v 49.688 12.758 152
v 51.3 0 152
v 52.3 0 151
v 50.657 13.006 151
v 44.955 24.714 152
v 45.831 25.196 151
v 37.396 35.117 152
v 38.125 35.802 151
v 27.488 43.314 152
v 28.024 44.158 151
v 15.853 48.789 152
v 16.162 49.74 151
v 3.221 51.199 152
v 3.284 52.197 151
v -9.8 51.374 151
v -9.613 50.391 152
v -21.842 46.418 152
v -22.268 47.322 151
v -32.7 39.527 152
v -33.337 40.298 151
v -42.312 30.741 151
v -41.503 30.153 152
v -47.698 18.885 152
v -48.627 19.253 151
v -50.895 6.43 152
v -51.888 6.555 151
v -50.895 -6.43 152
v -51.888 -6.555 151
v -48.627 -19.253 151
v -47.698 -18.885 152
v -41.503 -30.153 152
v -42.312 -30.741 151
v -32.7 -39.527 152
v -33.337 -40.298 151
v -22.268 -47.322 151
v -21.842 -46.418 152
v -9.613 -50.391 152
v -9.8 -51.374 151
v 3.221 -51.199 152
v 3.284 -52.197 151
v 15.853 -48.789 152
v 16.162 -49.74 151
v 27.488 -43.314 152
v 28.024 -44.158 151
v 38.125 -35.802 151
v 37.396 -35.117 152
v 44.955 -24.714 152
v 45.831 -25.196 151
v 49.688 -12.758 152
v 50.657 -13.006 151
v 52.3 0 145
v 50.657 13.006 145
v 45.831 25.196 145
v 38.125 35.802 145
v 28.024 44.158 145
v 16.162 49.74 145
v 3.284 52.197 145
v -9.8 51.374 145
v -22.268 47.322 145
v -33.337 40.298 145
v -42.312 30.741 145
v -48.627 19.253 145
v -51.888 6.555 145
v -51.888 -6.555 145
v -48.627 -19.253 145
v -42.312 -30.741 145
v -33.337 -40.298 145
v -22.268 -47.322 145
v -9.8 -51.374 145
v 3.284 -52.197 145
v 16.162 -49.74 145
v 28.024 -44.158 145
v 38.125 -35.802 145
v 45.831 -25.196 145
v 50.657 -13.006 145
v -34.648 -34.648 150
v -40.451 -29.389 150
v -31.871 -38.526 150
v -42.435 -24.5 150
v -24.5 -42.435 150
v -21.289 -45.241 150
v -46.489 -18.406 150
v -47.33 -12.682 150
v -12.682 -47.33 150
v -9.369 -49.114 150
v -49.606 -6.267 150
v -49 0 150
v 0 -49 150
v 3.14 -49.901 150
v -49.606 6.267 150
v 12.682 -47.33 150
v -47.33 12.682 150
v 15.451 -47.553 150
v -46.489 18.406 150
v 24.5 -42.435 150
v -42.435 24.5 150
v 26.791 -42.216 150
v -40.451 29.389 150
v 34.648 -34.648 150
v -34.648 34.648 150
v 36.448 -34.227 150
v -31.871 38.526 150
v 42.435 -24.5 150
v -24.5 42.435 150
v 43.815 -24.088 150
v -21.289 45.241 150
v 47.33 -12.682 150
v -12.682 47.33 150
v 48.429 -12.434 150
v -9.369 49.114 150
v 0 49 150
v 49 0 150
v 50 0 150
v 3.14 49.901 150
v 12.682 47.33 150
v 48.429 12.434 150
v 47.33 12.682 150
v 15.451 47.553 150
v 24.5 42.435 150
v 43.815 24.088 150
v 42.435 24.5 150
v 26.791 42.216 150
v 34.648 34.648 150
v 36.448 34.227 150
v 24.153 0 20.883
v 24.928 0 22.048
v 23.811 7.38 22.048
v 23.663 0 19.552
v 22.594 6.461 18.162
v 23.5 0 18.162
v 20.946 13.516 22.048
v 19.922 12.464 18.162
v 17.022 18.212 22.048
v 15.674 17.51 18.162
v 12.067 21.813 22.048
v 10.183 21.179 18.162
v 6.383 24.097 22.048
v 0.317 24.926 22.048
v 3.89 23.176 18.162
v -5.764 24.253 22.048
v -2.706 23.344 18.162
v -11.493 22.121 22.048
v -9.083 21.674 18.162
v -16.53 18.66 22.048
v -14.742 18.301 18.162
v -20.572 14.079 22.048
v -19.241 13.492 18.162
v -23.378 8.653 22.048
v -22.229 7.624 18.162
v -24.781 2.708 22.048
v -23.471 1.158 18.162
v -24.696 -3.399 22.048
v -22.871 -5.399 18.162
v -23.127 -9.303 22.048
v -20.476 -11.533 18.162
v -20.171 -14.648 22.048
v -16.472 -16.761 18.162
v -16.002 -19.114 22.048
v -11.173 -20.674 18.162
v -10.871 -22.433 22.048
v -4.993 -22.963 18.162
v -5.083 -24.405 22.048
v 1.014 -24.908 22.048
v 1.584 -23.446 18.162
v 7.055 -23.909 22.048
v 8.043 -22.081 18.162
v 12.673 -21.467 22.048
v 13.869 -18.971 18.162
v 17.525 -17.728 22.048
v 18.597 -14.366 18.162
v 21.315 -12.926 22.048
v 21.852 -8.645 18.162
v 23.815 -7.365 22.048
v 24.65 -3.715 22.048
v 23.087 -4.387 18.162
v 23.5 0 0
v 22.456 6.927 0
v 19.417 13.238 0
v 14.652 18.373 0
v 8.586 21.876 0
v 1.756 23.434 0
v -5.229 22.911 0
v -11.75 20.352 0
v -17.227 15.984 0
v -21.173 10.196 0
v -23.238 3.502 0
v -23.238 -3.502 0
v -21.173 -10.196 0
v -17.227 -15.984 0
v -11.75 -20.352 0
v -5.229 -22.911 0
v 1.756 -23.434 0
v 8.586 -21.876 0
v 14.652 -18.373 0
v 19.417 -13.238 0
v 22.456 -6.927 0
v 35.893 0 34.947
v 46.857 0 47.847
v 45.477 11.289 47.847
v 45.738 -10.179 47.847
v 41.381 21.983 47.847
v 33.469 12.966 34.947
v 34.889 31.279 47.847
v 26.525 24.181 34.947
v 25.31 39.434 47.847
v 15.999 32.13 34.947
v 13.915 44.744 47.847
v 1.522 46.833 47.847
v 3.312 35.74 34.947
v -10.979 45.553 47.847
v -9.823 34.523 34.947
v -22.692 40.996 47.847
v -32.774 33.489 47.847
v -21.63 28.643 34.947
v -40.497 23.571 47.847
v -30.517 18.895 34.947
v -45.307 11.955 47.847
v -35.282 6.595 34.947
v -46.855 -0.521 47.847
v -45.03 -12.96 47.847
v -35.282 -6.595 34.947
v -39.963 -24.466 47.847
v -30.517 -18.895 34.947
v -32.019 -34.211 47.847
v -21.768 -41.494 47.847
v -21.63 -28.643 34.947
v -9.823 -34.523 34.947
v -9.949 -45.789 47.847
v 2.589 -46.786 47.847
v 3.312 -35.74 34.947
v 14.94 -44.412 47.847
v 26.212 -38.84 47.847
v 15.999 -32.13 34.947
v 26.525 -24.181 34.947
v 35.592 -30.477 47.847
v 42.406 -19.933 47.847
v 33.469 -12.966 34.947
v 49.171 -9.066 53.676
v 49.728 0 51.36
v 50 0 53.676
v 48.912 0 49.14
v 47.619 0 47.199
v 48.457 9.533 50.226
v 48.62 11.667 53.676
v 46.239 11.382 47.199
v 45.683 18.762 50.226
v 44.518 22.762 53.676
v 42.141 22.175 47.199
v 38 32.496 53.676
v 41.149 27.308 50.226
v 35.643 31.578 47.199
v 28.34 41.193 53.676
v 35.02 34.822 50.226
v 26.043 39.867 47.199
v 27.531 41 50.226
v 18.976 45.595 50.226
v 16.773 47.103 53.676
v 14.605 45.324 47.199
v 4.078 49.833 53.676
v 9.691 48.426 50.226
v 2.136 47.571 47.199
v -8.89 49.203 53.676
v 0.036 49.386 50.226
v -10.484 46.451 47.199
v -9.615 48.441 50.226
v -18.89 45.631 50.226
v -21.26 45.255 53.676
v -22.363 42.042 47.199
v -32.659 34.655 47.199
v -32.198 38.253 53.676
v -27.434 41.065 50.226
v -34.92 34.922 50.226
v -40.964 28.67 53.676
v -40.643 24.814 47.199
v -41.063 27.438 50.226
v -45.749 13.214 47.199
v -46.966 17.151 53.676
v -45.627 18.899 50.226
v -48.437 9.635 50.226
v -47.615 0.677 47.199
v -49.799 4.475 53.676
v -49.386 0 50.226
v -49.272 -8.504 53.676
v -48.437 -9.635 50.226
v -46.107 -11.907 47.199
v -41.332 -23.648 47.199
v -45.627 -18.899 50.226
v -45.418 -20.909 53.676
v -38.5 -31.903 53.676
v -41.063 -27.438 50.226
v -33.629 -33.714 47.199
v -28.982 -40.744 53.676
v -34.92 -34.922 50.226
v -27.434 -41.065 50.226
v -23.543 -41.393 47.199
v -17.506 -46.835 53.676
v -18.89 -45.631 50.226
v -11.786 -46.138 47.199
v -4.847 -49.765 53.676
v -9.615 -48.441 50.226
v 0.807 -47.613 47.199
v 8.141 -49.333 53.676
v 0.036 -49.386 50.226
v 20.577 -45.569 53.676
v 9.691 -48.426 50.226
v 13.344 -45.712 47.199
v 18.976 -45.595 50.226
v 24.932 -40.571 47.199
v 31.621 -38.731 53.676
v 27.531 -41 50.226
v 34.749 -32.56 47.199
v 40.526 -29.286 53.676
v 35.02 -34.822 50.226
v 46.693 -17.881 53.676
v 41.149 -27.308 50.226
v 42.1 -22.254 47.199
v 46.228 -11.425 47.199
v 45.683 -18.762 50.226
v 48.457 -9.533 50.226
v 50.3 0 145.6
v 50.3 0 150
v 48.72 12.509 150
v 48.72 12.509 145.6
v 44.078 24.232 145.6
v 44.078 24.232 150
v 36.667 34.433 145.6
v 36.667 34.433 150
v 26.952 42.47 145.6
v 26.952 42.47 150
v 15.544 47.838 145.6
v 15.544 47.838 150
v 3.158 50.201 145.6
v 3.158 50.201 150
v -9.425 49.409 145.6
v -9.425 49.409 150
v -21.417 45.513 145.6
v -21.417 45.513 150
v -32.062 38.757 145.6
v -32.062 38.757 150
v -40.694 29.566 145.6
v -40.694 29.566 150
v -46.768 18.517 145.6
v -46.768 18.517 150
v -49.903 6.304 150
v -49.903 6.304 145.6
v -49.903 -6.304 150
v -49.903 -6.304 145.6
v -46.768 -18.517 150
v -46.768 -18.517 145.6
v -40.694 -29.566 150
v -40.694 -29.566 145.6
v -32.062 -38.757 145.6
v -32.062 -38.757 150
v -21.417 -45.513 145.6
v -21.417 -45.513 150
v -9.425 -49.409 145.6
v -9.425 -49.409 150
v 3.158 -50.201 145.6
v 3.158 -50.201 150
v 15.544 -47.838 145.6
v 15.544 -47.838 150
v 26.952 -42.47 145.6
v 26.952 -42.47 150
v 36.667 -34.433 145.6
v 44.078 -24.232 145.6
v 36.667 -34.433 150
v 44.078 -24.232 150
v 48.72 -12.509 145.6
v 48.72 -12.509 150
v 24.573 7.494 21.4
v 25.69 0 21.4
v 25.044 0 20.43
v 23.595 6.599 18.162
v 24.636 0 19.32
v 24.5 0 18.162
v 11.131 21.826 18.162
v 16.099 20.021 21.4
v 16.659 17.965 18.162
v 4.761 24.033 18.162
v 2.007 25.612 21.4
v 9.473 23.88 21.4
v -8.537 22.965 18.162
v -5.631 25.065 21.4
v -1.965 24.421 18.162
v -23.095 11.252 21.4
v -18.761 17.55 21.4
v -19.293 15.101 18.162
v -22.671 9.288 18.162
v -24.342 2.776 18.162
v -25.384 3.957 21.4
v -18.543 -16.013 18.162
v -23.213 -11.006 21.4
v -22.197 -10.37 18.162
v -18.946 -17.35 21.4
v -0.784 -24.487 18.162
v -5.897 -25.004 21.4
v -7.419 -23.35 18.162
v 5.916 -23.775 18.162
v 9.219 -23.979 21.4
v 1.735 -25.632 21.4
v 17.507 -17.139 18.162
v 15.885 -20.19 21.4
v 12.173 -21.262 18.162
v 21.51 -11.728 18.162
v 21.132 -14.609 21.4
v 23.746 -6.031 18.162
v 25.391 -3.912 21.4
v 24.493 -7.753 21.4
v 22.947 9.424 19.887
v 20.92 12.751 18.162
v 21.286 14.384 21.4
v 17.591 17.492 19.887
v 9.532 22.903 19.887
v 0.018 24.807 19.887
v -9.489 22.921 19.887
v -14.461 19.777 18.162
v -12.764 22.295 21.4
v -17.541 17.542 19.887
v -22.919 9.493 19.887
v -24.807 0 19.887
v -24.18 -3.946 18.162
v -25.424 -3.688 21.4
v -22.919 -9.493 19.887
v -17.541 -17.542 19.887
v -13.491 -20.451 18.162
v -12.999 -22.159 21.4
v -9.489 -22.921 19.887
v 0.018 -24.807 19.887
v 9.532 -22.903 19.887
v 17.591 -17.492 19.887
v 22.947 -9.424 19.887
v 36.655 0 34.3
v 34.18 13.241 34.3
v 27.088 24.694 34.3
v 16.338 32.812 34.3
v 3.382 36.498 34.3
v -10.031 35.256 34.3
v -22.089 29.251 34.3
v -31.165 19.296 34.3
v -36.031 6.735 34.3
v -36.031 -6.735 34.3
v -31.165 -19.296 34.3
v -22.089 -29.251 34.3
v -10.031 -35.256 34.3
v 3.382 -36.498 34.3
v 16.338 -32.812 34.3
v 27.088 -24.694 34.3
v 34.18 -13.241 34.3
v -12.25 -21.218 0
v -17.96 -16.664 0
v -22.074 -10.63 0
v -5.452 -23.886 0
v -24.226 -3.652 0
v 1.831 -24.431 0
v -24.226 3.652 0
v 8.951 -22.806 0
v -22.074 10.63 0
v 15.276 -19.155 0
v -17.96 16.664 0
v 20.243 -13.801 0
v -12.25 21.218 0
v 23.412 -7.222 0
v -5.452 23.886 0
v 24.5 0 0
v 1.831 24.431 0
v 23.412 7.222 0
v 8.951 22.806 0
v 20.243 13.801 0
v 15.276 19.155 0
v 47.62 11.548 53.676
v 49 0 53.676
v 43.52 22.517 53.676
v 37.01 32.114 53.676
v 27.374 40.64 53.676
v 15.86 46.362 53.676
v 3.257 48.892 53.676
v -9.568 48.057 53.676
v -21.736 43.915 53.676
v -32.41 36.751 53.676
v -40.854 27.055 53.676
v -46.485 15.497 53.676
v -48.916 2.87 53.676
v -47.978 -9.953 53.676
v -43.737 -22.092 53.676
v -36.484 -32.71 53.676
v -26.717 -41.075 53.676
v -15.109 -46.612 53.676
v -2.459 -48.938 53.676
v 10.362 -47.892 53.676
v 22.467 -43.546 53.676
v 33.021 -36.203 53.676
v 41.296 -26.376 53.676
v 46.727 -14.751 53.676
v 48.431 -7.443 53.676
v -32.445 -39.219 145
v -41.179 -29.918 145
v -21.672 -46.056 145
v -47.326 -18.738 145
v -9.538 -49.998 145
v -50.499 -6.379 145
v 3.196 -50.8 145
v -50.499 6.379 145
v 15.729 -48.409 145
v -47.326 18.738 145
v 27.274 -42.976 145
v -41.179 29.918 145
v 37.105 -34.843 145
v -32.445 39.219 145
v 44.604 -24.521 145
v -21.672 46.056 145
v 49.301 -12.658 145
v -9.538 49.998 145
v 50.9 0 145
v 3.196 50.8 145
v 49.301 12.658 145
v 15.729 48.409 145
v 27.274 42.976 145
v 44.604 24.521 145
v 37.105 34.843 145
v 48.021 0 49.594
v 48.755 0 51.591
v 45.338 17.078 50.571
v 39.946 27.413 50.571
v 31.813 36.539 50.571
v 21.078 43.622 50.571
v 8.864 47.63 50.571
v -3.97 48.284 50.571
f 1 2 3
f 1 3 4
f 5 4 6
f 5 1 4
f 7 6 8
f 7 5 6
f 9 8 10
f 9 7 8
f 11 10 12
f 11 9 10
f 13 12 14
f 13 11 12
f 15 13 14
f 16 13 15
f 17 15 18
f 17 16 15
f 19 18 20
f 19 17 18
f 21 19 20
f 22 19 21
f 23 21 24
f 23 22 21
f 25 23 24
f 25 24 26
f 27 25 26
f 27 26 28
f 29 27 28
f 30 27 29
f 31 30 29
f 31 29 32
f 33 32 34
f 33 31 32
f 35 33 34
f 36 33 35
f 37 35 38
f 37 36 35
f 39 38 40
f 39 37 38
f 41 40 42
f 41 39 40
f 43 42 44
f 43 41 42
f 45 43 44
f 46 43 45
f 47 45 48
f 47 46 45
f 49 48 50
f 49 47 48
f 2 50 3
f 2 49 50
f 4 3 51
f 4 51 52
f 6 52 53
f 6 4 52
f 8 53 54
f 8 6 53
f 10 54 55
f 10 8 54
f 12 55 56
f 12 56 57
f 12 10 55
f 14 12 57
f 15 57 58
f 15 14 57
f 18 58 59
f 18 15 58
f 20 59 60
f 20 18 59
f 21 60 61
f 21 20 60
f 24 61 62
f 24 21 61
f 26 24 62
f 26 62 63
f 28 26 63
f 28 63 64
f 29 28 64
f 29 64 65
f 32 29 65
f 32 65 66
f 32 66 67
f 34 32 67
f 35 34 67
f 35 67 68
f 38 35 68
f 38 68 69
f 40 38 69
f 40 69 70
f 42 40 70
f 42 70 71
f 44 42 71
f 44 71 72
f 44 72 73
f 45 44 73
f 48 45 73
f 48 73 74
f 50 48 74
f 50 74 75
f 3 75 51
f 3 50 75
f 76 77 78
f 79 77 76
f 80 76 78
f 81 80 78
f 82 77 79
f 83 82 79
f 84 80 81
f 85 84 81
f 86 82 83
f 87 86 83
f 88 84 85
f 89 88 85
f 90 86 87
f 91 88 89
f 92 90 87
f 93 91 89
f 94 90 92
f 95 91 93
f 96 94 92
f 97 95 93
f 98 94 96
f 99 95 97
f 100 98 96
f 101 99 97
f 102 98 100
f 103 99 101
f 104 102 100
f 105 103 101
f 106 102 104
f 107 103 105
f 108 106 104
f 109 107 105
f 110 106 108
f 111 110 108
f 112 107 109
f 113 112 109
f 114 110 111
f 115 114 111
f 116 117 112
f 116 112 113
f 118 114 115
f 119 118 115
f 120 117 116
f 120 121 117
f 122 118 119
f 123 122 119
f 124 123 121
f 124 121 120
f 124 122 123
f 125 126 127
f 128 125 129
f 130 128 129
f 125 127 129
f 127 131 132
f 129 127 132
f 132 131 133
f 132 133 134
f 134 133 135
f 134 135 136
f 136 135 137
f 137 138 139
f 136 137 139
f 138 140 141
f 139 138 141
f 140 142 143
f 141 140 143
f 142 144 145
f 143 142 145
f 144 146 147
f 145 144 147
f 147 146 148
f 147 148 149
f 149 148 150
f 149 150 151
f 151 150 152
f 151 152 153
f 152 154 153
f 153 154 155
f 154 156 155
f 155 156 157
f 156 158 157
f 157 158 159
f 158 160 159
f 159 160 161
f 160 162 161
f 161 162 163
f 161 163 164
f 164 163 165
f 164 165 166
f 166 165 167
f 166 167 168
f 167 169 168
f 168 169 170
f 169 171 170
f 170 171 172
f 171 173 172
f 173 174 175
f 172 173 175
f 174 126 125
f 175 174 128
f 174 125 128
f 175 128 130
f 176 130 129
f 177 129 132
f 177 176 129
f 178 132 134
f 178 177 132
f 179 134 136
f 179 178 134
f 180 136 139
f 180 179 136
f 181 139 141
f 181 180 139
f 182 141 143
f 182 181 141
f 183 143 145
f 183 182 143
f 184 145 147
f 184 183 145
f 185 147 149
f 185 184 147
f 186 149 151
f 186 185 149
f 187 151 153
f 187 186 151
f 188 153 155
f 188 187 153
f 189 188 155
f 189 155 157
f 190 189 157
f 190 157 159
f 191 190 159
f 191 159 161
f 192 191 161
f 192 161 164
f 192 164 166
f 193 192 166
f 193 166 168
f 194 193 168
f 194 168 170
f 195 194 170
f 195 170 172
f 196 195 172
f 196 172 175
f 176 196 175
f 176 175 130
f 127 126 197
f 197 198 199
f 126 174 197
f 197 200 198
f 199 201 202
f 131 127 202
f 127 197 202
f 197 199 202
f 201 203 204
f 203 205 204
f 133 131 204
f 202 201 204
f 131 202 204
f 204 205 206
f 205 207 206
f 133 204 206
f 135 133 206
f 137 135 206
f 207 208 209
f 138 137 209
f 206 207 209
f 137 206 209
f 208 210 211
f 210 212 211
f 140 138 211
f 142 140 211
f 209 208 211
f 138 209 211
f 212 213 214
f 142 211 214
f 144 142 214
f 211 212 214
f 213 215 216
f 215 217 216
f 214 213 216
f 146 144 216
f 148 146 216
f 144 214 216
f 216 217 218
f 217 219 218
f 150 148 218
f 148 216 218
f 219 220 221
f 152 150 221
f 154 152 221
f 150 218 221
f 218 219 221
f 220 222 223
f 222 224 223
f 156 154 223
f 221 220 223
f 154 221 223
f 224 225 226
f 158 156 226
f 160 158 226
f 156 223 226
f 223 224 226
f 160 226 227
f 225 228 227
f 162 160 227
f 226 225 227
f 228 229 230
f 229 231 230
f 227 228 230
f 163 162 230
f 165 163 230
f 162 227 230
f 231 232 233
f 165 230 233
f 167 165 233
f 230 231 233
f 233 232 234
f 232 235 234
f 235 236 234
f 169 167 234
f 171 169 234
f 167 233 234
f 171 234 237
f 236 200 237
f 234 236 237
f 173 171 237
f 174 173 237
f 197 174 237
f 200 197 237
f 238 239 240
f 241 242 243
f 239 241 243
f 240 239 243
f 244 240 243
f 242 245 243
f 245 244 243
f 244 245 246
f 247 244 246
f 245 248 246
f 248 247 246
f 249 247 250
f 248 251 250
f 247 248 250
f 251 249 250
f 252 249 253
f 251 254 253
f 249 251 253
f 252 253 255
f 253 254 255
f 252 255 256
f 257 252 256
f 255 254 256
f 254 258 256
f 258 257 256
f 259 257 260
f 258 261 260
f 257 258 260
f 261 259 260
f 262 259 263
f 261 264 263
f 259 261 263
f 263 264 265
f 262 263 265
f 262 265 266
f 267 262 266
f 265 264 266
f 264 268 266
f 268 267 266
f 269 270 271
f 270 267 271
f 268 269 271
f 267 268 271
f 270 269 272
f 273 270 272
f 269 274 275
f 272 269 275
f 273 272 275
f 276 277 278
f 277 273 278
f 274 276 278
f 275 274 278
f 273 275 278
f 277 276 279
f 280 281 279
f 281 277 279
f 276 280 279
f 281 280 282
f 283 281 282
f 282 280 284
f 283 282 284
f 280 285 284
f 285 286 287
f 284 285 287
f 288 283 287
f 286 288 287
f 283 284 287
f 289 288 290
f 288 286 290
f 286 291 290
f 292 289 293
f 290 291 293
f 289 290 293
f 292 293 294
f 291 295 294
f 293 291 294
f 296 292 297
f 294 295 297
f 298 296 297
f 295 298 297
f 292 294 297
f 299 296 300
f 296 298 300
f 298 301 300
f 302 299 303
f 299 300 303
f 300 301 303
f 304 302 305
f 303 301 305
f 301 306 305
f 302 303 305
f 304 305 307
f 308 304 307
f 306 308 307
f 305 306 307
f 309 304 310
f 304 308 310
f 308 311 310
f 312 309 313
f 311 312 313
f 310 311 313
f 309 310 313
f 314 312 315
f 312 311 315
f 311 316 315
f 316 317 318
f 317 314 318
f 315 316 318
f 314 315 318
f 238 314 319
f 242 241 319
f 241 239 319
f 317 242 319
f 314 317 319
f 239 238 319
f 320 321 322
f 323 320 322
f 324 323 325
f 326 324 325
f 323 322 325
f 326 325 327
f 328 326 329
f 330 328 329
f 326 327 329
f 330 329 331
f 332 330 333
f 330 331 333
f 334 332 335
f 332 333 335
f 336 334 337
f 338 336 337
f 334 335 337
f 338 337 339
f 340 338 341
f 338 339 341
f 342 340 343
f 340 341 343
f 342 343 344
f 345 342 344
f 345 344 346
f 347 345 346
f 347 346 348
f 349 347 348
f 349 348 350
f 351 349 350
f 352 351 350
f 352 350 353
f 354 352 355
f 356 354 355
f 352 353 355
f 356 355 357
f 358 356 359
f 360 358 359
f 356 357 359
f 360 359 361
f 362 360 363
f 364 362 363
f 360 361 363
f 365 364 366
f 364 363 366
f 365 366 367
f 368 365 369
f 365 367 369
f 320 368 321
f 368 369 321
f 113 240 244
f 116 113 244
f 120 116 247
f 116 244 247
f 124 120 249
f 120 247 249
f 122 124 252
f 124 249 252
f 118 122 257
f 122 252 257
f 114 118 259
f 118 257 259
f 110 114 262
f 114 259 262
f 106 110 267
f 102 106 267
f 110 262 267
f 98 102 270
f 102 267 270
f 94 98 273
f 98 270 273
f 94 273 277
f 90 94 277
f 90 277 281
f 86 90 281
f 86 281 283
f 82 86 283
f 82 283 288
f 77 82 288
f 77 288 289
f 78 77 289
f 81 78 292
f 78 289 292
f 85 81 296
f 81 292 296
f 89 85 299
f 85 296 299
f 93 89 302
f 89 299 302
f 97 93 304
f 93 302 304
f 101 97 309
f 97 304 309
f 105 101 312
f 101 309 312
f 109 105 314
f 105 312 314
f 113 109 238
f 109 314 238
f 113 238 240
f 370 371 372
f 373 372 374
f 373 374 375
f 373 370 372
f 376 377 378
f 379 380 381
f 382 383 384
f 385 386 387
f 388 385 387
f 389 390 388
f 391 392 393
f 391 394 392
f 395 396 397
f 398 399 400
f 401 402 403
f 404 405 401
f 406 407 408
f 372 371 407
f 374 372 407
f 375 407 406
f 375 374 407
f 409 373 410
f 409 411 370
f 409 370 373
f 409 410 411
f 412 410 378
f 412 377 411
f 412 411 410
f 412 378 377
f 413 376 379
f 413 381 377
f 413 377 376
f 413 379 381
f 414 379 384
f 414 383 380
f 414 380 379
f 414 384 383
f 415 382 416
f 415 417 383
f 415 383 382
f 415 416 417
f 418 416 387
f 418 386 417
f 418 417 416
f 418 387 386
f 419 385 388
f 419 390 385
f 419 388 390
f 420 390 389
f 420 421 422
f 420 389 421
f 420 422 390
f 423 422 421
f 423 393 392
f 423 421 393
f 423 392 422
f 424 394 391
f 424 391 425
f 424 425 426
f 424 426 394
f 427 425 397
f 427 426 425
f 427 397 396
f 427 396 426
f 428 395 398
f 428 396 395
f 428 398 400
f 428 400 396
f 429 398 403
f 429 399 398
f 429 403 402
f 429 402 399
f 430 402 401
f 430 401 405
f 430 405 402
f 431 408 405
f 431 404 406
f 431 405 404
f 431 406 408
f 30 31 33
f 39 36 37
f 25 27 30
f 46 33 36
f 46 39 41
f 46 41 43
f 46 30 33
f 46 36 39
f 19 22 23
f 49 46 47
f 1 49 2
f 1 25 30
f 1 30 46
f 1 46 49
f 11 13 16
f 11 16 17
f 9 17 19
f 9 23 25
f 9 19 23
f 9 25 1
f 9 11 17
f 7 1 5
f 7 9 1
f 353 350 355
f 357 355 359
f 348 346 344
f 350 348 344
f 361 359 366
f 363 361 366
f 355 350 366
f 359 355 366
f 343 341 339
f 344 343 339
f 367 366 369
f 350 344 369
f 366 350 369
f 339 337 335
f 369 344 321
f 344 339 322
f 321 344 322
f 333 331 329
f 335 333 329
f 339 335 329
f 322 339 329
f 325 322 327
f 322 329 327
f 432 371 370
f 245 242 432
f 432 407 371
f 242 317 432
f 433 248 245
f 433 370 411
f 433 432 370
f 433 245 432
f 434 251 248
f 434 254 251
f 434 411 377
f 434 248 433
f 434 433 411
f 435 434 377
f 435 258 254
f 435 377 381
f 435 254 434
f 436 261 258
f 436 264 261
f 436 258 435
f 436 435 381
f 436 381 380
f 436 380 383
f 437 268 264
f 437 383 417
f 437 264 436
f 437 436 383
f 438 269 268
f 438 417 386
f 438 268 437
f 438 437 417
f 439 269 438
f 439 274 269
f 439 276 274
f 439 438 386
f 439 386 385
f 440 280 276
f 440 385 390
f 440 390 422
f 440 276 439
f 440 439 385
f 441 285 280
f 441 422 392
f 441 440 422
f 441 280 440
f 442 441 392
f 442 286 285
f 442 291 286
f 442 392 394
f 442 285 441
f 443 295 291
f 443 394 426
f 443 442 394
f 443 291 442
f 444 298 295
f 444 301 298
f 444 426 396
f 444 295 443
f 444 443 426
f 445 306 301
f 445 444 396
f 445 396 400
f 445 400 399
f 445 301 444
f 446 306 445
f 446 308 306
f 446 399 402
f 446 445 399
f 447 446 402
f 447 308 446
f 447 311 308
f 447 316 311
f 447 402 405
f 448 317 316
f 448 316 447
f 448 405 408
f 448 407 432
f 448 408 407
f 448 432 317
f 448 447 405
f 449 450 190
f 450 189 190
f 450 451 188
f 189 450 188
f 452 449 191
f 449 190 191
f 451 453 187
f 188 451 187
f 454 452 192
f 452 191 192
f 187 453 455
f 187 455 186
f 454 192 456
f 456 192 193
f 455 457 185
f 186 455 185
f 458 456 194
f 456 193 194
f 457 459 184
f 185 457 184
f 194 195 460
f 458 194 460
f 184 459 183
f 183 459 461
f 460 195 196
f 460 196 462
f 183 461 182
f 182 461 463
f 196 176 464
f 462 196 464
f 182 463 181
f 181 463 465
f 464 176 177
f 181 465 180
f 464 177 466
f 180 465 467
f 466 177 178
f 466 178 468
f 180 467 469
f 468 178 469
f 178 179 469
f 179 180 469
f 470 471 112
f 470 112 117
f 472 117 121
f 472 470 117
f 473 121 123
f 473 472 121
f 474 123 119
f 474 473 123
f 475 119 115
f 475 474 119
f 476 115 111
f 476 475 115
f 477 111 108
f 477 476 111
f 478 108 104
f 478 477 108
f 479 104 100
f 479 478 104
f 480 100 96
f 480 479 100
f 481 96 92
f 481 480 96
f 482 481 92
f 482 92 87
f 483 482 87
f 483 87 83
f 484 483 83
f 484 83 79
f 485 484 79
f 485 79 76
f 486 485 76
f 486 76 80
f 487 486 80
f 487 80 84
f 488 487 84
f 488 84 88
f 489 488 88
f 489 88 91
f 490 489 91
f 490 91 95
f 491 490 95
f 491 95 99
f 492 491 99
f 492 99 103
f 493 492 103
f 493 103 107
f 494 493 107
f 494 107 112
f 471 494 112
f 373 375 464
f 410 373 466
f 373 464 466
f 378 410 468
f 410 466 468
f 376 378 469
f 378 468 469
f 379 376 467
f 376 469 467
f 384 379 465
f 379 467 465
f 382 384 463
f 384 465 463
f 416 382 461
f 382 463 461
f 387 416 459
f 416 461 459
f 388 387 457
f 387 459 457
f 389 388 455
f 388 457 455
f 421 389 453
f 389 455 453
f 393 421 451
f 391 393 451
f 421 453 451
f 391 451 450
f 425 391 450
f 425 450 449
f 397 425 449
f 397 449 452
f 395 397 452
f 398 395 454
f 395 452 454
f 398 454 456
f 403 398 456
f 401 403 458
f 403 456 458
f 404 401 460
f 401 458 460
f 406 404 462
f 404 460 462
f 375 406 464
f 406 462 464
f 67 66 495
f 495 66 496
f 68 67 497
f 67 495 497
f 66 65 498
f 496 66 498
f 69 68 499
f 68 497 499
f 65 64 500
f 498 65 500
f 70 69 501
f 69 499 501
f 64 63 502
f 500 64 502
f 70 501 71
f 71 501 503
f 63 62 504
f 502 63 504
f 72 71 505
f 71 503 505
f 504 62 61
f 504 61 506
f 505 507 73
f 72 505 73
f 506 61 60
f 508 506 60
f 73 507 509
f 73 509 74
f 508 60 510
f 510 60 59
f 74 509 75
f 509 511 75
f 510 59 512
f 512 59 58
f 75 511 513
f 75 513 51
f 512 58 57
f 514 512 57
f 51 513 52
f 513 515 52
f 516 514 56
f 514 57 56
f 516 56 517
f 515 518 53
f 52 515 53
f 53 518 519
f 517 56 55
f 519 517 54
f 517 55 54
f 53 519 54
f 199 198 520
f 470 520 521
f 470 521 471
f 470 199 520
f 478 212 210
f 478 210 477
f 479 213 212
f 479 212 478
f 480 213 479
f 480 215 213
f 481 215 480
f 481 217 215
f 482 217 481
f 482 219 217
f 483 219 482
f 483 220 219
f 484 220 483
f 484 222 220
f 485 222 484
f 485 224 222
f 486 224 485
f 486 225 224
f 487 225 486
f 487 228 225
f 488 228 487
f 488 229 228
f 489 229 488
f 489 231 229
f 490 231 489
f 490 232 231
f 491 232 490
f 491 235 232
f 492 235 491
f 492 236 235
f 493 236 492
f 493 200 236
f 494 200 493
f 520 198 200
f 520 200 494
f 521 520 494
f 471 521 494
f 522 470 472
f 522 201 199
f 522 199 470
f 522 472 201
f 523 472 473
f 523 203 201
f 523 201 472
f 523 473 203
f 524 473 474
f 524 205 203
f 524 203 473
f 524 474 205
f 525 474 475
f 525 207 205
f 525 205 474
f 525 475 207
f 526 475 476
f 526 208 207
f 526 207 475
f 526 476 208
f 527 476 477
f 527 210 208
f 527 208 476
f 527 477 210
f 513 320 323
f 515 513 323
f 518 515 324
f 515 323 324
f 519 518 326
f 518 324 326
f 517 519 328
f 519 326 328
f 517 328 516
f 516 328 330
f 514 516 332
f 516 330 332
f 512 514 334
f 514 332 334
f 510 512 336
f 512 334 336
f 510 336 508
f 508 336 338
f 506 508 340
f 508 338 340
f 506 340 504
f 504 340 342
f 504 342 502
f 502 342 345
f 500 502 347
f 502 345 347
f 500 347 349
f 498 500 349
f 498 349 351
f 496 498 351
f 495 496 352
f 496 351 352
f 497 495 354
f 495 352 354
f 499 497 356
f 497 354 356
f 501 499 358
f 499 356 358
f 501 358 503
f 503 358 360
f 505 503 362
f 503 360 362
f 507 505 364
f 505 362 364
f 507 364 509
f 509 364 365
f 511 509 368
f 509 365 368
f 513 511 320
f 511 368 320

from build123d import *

# Parameters (mm, degrees)
F0_R      = 24.5
F1_DEPTH  = 20
F1_FACE_R = 24.5
F3_R      = 50
F5_DEPTH  = 100
F6_R      = 5
F7_R      = 10
F8_T      = -1
F9_R      = 52.3
F9_R_2    = 50.3
F9_R_3    = 50
F9_R_4    = 49
F10_DEPTH = 2
F11_DEPTH = 5
F12_SIZE  = 1
F13_SIZE  = 0.6


with BuildPart() as f1:
    # F0 (on Top) → F1 (new body)
    with BuildSketch(Plane.XY):
        Circle(F0_R)
    extrude(amount=F1_DEPTH)

    # F1_face (on face) → F4 section 0
    with BuildSketch(Plane.XY.offset(20)):
        Circle(F1_FACE_R)
    # F3 (on offset) → F4 section 1
    with BuildSketch(Plane.XY.offset(50)):
        Circle(F3_R)
    loft()

    # F5 (add): a face of the model
    f5_faces = [f1.faces().sort_by_distance(p)[0] for p in [
        (0, 0, 50),
    ]]
    extrude(f5_faces, amount=F5_DEPTH)

    # F6
    f6_edges = [f1.edges().sort_by_distance(p)[0] for p in [
        (-24.5, 0, 20),
    ]]
    fillet(f6_edges, radius=F6_R)

    # F7
    f7_edges = [f1.edges().sort_by_distance(p)[0] for p in [
        (-50, 0, 50),
    ]]
    fillet(f7_edges, radius=F7_R)

    # F8
    f8_openings = [f1.faces().sort_by_distance(p)[0] for p in [
        (0, 0, 0),
        (0, 0, 150),
    ]]
    offset(amount=F8_T, openings=f8_openings)


with BuildPart() as f10:
    # F9 (on face) → F10 (new body)
    with BuildSketch(Plane.XY.offset(150)):
        Circle(F9_R)
        Circle(F9_R_2, mode=Mode.SUBTRACT)
        Circle(F9_R_2)
        Circle(F9_R_3, mode=Mode.SUBTRACT)
        Circle(F9_R_3)
        Circle(F9_R_4, mode=Mode.SUBTRACT)
        Circle(F9_R_4)
    extrude(amount=F10_DEPTH)

    # F9 (on face) → F11 (join)
    with BuildSketch(Plane.XY.offset(150)):
        Circle(F9_R)
        Circle(F9_R_2, mode=Mode.SUBTRACT)
    extrude(amount=-F11_DEPTH)

    # F12
    f12_edges = [f10.edges().sort_by_distance(p)[0] for p in [
        (-52.3, 0, 152),
    ]]
    chamfer(f12_edges, length=F12_SIZE)

    # F13
    f13_edges = [f10.edges().sort_by_distance(p)[0] for p in [
        (-50.3, 0, 145),
    ]]
    chamfer(f13_edges, length=F13_SIZE)


solid = Compound([f1.part, f10.part])
